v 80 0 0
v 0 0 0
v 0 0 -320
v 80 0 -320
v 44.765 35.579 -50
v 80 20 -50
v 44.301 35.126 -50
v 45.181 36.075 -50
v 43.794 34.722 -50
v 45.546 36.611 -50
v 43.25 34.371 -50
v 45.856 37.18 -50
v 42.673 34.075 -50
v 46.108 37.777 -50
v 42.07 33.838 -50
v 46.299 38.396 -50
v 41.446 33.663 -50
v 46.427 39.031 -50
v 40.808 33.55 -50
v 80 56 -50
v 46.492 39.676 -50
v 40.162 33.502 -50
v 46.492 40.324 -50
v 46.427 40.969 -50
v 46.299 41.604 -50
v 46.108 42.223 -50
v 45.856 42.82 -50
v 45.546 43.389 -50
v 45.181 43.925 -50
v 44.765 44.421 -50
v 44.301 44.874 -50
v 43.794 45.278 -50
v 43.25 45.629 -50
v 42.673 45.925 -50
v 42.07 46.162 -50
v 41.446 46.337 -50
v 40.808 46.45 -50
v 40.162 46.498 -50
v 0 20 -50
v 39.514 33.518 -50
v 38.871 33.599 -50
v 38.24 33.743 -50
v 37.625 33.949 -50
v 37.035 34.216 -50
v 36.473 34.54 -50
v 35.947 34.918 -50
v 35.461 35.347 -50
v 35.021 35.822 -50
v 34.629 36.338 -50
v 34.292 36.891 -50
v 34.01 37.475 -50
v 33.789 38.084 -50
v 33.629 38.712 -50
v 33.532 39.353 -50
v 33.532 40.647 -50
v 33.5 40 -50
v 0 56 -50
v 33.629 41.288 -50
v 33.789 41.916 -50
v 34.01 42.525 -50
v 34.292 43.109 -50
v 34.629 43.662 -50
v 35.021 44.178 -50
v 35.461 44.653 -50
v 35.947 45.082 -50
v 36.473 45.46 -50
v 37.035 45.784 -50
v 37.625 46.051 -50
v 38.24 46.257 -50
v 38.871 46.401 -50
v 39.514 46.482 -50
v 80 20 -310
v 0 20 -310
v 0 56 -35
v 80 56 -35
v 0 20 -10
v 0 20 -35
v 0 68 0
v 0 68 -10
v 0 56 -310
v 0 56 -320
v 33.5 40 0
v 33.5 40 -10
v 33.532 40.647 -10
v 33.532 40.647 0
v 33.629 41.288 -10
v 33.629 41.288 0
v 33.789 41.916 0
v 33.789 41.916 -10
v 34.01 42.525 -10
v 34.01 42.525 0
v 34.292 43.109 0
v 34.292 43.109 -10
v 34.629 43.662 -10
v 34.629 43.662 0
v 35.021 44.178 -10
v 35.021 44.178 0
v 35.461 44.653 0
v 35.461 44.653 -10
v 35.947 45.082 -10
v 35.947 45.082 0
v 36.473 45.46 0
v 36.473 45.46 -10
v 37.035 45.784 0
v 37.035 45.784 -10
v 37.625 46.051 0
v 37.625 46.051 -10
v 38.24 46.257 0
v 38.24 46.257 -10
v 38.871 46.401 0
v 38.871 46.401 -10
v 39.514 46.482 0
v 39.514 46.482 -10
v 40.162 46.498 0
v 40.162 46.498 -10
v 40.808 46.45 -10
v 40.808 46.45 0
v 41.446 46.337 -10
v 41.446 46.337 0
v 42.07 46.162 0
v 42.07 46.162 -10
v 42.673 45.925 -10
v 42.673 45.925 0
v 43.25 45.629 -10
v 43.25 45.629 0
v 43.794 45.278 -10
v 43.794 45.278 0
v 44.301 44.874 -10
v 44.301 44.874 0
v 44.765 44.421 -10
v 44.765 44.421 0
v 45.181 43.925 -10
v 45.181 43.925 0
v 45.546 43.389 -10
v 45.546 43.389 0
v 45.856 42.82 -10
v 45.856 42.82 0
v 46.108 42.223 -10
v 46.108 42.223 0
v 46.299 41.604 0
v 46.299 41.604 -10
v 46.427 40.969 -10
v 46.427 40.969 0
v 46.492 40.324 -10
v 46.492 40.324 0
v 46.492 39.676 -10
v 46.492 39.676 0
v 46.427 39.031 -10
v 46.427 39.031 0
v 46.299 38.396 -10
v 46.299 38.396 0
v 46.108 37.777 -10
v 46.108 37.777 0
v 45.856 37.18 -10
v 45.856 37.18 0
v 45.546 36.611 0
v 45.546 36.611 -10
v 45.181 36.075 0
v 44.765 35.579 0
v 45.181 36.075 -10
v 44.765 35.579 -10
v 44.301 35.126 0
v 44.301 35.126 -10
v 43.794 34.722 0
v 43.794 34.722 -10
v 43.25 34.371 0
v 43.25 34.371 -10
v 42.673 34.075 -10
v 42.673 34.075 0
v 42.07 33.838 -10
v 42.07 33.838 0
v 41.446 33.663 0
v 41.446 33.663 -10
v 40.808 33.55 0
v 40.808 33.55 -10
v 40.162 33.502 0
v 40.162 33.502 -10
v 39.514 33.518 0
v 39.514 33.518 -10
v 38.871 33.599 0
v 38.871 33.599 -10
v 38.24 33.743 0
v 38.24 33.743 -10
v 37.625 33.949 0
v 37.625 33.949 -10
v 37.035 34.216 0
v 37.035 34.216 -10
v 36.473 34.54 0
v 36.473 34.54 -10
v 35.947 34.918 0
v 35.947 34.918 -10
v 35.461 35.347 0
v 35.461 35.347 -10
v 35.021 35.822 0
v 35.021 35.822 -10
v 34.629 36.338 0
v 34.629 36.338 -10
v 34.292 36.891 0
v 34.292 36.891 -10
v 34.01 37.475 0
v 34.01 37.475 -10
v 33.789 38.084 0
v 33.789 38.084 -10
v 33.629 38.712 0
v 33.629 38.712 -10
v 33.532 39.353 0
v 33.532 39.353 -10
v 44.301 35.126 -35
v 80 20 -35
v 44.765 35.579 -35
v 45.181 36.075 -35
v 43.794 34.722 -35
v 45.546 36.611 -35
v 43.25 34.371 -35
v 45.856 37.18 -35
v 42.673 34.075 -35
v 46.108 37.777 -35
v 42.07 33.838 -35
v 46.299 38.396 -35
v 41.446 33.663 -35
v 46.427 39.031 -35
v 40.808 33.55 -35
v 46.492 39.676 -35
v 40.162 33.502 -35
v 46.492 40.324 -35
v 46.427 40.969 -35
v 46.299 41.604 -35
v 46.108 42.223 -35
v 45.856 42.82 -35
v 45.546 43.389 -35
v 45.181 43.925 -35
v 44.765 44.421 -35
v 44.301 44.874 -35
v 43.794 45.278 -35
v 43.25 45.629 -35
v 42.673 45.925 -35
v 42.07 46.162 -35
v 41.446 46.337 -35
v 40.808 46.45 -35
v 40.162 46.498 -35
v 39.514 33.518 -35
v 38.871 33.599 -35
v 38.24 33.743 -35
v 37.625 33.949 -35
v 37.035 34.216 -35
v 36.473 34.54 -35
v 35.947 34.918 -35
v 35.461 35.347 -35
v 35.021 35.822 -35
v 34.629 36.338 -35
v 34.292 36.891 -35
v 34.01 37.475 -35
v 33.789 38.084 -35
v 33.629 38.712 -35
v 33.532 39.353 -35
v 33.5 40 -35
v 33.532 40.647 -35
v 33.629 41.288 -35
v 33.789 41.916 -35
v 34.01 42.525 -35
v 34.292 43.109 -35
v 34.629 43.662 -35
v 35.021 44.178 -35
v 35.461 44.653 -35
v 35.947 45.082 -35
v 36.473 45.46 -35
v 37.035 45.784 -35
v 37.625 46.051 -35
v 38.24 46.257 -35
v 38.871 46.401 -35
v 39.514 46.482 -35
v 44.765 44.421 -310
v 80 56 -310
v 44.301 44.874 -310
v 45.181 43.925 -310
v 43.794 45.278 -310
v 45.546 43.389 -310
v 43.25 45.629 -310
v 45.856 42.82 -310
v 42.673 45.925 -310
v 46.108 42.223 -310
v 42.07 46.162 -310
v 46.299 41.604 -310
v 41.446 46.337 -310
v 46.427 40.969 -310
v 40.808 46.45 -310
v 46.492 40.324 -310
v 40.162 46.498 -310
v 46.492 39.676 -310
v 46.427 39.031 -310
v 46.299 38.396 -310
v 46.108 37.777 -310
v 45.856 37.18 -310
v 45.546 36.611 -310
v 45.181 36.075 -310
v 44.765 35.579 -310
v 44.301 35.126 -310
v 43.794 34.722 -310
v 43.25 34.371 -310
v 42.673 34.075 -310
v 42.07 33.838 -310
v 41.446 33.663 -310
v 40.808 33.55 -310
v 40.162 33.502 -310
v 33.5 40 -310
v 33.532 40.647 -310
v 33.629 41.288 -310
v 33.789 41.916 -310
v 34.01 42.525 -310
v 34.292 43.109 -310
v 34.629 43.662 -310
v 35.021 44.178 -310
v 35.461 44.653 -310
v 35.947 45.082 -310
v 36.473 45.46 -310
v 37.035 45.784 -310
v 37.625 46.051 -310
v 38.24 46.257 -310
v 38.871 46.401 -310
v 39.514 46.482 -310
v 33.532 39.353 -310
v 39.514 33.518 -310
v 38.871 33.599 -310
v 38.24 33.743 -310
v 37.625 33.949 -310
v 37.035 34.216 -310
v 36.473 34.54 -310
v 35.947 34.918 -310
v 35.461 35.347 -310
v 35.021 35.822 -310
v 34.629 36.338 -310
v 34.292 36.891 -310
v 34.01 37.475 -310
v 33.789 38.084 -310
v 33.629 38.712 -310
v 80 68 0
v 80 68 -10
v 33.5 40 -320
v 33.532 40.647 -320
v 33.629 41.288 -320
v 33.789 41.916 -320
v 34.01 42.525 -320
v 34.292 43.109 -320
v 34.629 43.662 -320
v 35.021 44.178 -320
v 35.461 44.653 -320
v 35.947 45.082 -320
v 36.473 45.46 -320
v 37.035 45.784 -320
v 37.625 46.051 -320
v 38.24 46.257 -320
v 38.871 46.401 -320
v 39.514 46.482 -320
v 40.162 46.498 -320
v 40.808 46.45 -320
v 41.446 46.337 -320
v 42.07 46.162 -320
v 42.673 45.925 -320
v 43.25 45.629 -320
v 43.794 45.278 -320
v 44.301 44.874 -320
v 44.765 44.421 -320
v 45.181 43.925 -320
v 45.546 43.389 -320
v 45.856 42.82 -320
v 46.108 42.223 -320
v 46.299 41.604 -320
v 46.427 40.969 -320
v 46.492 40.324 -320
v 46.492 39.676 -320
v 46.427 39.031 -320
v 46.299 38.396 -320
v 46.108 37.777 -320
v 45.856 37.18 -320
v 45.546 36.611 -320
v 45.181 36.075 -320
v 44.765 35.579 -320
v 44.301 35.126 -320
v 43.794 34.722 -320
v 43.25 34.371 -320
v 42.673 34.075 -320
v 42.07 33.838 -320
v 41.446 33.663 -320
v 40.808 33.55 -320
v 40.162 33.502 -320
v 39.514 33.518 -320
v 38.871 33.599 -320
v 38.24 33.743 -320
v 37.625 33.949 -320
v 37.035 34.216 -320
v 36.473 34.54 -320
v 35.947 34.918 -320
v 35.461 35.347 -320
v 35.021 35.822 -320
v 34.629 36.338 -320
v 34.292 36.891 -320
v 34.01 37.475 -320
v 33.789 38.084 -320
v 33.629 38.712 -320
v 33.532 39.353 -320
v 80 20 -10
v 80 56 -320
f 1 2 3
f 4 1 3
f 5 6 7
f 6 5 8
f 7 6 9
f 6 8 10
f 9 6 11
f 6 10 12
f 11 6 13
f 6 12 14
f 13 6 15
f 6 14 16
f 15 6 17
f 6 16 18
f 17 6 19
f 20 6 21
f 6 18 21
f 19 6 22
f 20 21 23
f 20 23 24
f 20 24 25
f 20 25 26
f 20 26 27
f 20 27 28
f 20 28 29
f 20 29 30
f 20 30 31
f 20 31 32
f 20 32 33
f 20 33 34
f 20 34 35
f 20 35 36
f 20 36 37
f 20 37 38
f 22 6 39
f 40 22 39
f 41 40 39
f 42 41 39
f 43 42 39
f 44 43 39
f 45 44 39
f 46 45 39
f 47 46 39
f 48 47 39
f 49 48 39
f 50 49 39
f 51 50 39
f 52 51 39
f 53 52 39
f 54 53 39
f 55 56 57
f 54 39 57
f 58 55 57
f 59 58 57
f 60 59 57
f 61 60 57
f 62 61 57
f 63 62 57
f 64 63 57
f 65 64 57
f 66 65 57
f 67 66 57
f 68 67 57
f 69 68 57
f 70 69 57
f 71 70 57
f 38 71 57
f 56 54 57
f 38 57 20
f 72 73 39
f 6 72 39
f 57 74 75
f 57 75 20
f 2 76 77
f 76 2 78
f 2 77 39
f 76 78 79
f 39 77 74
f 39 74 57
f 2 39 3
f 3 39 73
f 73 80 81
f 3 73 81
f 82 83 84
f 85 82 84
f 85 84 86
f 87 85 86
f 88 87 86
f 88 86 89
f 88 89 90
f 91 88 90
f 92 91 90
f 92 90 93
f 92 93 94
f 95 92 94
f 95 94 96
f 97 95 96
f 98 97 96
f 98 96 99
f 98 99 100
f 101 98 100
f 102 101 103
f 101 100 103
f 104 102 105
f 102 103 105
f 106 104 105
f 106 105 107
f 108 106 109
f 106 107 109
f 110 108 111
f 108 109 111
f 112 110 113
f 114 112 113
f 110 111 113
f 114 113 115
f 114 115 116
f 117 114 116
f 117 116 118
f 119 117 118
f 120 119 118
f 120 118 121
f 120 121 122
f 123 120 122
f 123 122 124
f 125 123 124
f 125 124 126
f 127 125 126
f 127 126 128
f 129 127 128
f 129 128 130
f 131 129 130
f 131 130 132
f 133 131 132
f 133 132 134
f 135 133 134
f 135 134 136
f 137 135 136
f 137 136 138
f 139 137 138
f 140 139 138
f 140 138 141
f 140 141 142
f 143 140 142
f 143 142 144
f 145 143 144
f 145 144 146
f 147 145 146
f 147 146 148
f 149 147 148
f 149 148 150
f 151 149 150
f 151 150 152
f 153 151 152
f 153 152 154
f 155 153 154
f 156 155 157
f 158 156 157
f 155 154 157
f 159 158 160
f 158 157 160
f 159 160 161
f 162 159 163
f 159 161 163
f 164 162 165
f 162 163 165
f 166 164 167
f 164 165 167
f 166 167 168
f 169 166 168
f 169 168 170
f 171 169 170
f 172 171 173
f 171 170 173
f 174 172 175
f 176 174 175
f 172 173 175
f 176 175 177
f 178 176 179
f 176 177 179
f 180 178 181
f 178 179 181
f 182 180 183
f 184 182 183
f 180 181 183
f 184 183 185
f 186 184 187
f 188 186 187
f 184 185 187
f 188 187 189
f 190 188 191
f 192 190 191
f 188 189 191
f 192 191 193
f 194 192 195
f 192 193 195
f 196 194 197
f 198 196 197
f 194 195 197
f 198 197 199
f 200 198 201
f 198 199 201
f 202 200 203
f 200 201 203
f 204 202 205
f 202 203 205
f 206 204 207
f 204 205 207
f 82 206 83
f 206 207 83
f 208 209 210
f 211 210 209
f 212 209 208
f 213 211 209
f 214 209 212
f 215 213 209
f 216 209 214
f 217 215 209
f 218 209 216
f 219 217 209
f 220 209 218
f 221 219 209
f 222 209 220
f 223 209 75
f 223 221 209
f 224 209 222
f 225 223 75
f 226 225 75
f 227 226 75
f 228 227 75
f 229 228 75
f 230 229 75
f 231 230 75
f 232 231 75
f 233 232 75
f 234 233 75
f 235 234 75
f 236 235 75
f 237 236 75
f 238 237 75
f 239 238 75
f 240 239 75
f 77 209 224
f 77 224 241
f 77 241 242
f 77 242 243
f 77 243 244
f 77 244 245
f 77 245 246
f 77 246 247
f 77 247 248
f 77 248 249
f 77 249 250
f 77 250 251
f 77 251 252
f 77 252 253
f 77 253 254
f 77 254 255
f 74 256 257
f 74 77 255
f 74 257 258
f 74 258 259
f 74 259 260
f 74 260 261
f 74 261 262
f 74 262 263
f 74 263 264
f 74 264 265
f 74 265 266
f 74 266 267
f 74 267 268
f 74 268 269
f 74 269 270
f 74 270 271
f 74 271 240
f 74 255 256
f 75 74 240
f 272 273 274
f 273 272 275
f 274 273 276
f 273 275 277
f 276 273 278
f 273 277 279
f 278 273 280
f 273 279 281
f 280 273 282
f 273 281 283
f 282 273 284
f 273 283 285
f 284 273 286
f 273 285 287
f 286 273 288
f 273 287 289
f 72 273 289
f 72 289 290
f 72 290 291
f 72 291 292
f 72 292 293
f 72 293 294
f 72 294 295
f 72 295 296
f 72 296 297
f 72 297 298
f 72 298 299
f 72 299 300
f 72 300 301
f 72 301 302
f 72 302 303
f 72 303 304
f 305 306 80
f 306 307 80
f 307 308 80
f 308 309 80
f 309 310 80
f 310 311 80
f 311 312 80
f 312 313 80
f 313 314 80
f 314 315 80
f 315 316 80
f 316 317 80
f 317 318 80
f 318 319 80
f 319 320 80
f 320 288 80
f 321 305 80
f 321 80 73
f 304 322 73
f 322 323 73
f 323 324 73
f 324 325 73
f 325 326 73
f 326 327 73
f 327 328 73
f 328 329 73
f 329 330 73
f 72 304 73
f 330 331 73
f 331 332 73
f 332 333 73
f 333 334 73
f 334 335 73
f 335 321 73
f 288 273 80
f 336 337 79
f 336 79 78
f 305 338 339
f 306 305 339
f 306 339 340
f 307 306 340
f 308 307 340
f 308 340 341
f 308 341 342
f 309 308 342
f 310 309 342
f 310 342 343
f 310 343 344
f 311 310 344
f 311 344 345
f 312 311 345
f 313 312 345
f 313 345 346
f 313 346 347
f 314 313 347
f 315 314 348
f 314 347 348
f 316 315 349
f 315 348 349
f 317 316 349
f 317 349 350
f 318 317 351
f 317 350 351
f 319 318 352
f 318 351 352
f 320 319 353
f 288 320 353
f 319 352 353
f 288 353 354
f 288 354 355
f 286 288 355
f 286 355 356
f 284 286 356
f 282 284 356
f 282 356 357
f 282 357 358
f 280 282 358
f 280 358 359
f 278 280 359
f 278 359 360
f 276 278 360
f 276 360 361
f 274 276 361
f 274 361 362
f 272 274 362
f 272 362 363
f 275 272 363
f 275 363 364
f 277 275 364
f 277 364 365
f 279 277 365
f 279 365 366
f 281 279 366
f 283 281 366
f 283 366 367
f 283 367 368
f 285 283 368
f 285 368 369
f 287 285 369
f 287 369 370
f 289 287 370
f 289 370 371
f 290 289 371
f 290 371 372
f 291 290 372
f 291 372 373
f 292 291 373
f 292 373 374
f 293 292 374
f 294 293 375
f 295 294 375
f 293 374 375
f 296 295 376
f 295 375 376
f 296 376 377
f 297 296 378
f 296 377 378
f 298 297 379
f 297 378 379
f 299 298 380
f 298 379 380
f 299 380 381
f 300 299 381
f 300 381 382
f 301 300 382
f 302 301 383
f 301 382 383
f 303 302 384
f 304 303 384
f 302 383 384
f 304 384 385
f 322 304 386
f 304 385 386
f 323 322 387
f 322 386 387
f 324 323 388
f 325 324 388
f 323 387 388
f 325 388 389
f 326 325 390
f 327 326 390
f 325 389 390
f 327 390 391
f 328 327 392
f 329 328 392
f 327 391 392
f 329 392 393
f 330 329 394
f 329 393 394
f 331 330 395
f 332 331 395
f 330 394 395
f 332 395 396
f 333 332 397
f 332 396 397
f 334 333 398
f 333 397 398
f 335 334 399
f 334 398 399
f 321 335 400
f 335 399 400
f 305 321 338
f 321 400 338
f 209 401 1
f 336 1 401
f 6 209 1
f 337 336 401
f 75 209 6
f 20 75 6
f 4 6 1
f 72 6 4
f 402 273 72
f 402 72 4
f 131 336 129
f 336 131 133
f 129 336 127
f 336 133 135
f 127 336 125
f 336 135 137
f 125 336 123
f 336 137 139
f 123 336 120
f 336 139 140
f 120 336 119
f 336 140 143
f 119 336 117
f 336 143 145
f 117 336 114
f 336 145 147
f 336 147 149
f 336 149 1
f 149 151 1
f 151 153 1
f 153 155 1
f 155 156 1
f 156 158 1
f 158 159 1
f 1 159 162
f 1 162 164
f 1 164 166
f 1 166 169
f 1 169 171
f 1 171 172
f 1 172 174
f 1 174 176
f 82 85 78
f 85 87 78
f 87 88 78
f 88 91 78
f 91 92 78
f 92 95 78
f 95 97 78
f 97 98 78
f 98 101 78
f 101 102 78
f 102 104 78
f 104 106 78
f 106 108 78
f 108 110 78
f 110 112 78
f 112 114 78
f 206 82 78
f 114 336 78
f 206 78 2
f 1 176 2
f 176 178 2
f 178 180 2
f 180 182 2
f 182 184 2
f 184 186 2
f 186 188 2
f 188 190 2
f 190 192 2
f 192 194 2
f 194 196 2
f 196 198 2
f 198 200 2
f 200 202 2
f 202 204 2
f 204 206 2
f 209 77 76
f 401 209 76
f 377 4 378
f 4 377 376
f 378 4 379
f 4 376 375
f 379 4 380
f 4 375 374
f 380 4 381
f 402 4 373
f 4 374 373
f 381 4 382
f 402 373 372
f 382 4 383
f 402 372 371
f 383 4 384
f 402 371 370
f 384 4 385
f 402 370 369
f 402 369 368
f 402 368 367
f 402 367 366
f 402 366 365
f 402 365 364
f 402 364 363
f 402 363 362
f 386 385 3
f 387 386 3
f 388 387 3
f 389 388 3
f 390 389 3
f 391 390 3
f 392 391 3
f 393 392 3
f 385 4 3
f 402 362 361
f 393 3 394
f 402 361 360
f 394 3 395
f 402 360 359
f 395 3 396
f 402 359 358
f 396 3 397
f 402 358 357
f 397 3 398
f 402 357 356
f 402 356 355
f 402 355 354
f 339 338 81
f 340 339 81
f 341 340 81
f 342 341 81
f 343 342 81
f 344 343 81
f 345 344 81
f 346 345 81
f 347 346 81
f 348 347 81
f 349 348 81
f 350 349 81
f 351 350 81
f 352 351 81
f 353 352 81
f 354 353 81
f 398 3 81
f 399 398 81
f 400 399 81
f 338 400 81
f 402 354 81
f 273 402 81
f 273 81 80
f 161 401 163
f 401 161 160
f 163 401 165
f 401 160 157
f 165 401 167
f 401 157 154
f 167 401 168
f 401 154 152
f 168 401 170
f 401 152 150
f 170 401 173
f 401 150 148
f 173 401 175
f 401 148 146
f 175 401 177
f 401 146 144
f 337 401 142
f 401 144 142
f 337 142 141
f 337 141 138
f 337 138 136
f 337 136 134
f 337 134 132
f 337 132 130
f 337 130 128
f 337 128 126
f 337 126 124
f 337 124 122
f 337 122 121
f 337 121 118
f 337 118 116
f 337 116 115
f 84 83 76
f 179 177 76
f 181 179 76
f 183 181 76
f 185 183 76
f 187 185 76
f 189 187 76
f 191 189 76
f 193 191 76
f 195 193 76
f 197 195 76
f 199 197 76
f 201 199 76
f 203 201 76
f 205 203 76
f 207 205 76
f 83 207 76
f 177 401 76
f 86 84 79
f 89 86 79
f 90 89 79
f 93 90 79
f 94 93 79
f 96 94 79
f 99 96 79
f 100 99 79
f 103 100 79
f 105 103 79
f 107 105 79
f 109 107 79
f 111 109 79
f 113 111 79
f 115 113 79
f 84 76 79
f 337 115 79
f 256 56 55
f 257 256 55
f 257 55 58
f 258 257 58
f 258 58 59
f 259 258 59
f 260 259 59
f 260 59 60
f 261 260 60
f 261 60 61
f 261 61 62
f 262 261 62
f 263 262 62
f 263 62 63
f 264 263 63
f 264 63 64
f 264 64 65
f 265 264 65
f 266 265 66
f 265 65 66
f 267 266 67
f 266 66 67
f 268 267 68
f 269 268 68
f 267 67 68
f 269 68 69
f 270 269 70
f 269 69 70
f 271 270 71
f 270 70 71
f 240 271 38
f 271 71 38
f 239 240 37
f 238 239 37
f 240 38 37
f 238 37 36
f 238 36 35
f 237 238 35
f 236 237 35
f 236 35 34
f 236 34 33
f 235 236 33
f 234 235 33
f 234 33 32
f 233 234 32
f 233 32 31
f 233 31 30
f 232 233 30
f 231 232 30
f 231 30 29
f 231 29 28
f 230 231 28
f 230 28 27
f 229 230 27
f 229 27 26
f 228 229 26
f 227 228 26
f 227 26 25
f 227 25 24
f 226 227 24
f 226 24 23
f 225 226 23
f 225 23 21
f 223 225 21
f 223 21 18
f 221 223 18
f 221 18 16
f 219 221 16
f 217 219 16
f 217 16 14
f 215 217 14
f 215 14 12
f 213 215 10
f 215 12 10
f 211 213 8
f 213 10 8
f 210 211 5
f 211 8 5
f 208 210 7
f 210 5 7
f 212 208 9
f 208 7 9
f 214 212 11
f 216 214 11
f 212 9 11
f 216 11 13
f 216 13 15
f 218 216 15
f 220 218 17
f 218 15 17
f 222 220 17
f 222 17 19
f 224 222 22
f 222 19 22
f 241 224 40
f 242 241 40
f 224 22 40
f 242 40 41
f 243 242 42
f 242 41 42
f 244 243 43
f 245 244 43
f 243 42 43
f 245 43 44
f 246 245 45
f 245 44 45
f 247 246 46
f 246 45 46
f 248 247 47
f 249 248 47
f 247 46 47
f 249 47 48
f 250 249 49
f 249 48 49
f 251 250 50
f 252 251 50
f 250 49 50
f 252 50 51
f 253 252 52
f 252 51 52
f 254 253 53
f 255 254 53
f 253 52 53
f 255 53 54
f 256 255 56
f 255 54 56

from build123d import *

# Parameters (mm, degrees)
SKETCH1_W           = 15
SKETCH1_H           = 36
BOSS_EXTRUDE1_DEPTH = 80
SKETCH2_R           = 6.5
CUT_EXTRUDE1_DEPTH  = 321


with BuildPart() as part:
    # Sketch1 → Boss-Extrude1 (new body)
    with BuildSketch(Plane(origin=(0, 0, 0), x_dir=(0, 0, -1), z_dir=(1, 0, 0))):
        with Locations((42.5, 38)):
            Rectangle(SKETCH1_W, SKETCH1_H)
        Polygon((320, 56), (310, 56), (310, 20), (10, 20), (10, 68), (0, 68), (0, 20), (0, 0), (320, 0), (320, 20), align=None)
    extrude(amount=BOSS_EXTRUDE1_DEPTH)

    # Sketch2 → Cut-Extrude1 (cut, through all)
    with BuildSketch(Plane(origin=(0, 0, -320), x_dir=(-1, 0, 0), z_dir=(0, 0, -1))):
        with Locations((-40, 40)):
            Circle(SKETCH2_R)
    extrude(amount=-CUT_EXTRUDE1_DEPTH, mode=Mode.SUBTRACT)


solid = part.part
